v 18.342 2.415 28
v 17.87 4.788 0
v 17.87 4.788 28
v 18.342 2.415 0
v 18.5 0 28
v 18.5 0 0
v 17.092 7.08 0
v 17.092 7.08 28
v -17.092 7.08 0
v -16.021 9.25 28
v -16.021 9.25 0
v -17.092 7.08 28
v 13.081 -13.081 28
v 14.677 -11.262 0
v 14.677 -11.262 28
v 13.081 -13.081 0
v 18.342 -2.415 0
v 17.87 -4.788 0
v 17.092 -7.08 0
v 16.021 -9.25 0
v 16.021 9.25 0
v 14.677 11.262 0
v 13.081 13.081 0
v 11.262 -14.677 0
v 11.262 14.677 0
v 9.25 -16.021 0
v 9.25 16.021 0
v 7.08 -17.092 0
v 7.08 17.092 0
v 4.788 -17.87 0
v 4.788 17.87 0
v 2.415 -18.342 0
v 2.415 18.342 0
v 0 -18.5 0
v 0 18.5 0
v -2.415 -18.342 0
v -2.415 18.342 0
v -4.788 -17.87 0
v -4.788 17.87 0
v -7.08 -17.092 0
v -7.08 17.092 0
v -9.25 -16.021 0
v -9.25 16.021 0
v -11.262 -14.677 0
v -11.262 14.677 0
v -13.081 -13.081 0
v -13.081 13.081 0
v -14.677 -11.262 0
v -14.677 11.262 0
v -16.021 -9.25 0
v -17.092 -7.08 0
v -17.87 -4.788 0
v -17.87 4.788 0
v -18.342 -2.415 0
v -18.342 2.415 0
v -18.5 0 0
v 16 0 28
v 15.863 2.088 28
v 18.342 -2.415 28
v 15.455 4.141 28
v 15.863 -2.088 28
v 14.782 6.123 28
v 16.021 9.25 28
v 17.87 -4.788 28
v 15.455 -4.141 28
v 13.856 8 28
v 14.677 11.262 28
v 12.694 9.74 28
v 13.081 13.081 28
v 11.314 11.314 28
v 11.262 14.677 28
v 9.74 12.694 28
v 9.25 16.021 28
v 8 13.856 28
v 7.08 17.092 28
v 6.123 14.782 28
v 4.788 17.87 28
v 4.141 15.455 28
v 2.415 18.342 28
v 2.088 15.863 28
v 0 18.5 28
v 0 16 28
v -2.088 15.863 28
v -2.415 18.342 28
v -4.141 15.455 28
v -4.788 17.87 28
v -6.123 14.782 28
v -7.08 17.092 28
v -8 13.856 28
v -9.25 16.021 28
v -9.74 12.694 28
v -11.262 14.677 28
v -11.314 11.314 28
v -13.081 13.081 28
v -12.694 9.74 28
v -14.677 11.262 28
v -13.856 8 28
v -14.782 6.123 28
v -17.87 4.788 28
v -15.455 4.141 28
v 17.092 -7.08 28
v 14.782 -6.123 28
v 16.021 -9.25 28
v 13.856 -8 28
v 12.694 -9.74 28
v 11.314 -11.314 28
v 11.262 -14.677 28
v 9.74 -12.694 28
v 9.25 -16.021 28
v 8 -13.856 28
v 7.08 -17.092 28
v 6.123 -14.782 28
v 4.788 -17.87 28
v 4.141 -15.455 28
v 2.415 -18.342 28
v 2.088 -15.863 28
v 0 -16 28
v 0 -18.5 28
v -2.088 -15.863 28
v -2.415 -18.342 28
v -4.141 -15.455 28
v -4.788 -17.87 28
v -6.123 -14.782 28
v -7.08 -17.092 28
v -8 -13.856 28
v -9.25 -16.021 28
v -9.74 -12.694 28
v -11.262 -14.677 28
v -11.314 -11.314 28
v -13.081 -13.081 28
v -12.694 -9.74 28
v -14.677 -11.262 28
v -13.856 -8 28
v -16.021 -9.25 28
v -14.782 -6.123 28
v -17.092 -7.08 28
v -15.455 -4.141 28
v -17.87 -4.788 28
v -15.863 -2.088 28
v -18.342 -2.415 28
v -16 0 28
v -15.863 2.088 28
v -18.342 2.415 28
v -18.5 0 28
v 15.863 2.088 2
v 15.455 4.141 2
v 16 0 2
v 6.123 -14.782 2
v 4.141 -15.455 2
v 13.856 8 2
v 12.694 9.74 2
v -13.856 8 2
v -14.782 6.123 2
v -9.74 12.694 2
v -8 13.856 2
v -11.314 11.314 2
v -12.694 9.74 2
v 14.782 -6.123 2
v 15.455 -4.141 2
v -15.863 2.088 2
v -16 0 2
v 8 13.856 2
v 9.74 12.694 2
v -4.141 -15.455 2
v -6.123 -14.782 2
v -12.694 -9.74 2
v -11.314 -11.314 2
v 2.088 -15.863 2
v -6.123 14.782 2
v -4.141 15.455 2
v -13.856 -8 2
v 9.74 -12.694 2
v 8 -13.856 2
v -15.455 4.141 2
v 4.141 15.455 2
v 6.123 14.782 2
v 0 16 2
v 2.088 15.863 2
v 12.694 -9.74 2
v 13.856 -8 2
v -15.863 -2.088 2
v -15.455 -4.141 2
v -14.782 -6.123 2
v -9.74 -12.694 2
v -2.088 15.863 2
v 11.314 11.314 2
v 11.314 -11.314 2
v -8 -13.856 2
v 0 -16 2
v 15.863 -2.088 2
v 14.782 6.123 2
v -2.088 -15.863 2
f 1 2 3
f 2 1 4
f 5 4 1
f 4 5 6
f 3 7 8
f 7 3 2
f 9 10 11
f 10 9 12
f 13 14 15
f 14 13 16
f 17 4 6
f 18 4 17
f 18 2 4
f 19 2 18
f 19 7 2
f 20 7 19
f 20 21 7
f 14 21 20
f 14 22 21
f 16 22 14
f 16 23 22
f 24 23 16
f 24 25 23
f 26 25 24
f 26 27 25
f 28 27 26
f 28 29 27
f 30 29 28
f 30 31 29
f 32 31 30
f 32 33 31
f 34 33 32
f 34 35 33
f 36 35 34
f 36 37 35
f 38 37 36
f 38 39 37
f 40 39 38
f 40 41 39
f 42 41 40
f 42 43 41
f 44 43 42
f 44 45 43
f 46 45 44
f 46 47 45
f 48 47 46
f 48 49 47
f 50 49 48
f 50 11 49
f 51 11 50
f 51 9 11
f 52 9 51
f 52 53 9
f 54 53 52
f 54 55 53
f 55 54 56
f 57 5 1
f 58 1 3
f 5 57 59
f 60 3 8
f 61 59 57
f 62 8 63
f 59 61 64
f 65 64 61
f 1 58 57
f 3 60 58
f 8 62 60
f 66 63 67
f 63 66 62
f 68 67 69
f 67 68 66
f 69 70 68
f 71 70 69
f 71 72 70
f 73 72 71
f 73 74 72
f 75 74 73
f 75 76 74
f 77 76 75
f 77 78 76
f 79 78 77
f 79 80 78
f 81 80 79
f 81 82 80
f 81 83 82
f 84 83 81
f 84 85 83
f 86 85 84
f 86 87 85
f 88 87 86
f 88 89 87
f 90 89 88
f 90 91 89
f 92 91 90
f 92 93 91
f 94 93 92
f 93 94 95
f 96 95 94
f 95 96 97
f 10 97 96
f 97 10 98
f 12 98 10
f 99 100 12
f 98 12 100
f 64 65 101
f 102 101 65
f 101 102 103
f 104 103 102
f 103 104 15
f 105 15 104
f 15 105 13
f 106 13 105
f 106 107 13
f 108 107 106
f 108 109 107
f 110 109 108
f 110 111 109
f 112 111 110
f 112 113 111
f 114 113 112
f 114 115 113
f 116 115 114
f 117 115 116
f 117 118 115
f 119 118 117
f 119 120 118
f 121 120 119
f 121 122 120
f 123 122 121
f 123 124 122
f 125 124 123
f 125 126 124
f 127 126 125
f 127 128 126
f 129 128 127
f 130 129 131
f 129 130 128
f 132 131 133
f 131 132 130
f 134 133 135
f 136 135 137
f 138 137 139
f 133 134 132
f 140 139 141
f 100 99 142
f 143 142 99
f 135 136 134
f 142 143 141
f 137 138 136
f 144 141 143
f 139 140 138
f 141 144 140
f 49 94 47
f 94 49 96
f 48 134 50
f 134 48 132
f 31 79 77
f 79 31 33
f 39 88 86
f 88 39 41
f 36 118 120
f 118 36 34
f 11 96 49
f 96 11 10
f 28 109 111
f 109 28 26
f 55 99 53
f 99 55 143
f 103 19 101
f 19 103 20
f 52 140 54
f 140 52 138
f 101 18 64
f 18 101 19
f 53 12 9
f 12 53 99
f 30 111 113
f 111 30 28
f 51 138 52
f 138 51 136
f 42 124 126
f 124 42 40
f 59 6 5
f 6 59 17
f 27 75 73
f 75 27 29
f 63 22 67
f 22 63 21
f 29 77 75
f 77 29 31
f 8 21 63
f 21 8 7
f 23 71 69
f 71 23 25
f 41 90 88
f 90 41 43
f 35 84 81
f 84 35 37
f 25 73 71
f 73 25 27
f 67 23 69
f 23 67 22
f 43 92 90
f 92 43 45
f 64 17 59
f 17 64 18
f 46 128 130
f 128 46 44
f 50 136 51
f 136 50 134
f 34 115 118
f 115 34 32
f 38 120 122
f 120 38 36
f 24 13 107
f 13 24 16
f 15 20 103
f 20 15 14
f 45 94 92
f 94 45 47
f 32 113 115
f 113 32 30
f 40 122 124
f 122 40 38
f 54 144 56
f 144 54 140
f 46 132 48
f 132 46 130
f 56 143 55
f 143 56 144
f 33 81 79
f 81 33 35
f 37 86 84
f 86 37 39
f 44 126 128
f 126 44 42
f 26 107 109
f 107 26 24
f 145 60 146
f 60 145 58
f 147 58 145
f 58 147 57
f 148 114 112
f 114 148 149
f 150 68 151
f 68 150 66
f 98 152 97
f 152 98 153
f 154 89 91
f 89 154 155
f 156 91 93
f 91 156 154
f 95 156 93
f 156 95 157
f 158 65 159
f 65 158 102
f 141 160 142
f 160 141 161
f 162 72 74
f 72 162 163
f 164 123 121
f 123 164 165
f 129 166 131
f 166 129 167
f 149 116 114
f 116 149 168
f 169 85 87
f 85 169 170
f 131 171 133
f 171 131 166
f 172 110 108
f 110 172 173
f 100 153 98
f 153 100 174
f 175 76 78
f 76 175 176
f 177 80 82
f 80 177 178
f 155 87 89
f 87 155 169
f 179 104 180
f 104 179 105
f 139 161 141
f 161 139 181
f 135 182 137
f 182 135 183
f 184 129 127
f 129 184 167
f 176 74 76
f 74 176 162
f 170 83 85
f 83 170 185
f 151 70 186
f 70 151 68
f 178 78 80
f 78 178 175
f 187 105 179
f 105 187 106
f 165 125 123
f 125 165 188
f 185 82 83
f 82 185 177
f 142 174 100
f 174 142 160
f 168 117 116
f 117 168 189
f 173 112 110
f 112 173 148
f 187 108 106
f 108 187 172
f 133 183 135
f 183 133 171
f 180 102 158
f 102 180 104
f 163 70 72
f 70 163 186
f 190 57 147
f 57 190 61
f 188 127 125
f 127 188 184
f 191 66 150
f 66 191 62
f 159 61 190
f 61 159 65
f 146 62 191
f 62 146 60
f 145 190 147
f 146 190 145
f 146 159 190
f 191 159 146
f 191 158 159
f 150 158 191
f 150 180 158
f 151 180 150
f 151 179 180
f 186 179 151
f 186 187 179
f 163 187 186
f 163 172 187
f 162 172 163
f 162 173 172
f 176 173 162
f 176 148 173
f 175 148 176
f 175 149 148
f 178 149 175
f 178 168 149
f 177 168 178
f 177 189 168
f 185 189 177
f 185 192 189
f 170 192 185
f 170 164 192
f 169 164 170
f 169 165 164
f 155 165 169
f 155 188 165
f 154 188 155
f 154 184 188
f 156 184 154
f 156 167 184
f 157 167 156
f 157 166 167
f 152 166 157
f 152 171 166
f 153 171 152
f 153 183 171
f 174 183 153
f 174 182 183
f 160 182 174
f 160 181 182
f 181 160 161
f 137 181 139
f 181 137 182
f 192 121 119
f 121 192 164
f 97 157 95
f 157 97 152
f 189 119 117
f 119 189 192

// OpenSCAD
module planetary_shell(od=37,h=28){
  difference(){
    cylinder(h=h,r=od/2,$fn=48);
    translate([0,0,2]) cylinder(h=h,r=od/2-2.5,$fn=48);
  }
}
planetary_shell();
